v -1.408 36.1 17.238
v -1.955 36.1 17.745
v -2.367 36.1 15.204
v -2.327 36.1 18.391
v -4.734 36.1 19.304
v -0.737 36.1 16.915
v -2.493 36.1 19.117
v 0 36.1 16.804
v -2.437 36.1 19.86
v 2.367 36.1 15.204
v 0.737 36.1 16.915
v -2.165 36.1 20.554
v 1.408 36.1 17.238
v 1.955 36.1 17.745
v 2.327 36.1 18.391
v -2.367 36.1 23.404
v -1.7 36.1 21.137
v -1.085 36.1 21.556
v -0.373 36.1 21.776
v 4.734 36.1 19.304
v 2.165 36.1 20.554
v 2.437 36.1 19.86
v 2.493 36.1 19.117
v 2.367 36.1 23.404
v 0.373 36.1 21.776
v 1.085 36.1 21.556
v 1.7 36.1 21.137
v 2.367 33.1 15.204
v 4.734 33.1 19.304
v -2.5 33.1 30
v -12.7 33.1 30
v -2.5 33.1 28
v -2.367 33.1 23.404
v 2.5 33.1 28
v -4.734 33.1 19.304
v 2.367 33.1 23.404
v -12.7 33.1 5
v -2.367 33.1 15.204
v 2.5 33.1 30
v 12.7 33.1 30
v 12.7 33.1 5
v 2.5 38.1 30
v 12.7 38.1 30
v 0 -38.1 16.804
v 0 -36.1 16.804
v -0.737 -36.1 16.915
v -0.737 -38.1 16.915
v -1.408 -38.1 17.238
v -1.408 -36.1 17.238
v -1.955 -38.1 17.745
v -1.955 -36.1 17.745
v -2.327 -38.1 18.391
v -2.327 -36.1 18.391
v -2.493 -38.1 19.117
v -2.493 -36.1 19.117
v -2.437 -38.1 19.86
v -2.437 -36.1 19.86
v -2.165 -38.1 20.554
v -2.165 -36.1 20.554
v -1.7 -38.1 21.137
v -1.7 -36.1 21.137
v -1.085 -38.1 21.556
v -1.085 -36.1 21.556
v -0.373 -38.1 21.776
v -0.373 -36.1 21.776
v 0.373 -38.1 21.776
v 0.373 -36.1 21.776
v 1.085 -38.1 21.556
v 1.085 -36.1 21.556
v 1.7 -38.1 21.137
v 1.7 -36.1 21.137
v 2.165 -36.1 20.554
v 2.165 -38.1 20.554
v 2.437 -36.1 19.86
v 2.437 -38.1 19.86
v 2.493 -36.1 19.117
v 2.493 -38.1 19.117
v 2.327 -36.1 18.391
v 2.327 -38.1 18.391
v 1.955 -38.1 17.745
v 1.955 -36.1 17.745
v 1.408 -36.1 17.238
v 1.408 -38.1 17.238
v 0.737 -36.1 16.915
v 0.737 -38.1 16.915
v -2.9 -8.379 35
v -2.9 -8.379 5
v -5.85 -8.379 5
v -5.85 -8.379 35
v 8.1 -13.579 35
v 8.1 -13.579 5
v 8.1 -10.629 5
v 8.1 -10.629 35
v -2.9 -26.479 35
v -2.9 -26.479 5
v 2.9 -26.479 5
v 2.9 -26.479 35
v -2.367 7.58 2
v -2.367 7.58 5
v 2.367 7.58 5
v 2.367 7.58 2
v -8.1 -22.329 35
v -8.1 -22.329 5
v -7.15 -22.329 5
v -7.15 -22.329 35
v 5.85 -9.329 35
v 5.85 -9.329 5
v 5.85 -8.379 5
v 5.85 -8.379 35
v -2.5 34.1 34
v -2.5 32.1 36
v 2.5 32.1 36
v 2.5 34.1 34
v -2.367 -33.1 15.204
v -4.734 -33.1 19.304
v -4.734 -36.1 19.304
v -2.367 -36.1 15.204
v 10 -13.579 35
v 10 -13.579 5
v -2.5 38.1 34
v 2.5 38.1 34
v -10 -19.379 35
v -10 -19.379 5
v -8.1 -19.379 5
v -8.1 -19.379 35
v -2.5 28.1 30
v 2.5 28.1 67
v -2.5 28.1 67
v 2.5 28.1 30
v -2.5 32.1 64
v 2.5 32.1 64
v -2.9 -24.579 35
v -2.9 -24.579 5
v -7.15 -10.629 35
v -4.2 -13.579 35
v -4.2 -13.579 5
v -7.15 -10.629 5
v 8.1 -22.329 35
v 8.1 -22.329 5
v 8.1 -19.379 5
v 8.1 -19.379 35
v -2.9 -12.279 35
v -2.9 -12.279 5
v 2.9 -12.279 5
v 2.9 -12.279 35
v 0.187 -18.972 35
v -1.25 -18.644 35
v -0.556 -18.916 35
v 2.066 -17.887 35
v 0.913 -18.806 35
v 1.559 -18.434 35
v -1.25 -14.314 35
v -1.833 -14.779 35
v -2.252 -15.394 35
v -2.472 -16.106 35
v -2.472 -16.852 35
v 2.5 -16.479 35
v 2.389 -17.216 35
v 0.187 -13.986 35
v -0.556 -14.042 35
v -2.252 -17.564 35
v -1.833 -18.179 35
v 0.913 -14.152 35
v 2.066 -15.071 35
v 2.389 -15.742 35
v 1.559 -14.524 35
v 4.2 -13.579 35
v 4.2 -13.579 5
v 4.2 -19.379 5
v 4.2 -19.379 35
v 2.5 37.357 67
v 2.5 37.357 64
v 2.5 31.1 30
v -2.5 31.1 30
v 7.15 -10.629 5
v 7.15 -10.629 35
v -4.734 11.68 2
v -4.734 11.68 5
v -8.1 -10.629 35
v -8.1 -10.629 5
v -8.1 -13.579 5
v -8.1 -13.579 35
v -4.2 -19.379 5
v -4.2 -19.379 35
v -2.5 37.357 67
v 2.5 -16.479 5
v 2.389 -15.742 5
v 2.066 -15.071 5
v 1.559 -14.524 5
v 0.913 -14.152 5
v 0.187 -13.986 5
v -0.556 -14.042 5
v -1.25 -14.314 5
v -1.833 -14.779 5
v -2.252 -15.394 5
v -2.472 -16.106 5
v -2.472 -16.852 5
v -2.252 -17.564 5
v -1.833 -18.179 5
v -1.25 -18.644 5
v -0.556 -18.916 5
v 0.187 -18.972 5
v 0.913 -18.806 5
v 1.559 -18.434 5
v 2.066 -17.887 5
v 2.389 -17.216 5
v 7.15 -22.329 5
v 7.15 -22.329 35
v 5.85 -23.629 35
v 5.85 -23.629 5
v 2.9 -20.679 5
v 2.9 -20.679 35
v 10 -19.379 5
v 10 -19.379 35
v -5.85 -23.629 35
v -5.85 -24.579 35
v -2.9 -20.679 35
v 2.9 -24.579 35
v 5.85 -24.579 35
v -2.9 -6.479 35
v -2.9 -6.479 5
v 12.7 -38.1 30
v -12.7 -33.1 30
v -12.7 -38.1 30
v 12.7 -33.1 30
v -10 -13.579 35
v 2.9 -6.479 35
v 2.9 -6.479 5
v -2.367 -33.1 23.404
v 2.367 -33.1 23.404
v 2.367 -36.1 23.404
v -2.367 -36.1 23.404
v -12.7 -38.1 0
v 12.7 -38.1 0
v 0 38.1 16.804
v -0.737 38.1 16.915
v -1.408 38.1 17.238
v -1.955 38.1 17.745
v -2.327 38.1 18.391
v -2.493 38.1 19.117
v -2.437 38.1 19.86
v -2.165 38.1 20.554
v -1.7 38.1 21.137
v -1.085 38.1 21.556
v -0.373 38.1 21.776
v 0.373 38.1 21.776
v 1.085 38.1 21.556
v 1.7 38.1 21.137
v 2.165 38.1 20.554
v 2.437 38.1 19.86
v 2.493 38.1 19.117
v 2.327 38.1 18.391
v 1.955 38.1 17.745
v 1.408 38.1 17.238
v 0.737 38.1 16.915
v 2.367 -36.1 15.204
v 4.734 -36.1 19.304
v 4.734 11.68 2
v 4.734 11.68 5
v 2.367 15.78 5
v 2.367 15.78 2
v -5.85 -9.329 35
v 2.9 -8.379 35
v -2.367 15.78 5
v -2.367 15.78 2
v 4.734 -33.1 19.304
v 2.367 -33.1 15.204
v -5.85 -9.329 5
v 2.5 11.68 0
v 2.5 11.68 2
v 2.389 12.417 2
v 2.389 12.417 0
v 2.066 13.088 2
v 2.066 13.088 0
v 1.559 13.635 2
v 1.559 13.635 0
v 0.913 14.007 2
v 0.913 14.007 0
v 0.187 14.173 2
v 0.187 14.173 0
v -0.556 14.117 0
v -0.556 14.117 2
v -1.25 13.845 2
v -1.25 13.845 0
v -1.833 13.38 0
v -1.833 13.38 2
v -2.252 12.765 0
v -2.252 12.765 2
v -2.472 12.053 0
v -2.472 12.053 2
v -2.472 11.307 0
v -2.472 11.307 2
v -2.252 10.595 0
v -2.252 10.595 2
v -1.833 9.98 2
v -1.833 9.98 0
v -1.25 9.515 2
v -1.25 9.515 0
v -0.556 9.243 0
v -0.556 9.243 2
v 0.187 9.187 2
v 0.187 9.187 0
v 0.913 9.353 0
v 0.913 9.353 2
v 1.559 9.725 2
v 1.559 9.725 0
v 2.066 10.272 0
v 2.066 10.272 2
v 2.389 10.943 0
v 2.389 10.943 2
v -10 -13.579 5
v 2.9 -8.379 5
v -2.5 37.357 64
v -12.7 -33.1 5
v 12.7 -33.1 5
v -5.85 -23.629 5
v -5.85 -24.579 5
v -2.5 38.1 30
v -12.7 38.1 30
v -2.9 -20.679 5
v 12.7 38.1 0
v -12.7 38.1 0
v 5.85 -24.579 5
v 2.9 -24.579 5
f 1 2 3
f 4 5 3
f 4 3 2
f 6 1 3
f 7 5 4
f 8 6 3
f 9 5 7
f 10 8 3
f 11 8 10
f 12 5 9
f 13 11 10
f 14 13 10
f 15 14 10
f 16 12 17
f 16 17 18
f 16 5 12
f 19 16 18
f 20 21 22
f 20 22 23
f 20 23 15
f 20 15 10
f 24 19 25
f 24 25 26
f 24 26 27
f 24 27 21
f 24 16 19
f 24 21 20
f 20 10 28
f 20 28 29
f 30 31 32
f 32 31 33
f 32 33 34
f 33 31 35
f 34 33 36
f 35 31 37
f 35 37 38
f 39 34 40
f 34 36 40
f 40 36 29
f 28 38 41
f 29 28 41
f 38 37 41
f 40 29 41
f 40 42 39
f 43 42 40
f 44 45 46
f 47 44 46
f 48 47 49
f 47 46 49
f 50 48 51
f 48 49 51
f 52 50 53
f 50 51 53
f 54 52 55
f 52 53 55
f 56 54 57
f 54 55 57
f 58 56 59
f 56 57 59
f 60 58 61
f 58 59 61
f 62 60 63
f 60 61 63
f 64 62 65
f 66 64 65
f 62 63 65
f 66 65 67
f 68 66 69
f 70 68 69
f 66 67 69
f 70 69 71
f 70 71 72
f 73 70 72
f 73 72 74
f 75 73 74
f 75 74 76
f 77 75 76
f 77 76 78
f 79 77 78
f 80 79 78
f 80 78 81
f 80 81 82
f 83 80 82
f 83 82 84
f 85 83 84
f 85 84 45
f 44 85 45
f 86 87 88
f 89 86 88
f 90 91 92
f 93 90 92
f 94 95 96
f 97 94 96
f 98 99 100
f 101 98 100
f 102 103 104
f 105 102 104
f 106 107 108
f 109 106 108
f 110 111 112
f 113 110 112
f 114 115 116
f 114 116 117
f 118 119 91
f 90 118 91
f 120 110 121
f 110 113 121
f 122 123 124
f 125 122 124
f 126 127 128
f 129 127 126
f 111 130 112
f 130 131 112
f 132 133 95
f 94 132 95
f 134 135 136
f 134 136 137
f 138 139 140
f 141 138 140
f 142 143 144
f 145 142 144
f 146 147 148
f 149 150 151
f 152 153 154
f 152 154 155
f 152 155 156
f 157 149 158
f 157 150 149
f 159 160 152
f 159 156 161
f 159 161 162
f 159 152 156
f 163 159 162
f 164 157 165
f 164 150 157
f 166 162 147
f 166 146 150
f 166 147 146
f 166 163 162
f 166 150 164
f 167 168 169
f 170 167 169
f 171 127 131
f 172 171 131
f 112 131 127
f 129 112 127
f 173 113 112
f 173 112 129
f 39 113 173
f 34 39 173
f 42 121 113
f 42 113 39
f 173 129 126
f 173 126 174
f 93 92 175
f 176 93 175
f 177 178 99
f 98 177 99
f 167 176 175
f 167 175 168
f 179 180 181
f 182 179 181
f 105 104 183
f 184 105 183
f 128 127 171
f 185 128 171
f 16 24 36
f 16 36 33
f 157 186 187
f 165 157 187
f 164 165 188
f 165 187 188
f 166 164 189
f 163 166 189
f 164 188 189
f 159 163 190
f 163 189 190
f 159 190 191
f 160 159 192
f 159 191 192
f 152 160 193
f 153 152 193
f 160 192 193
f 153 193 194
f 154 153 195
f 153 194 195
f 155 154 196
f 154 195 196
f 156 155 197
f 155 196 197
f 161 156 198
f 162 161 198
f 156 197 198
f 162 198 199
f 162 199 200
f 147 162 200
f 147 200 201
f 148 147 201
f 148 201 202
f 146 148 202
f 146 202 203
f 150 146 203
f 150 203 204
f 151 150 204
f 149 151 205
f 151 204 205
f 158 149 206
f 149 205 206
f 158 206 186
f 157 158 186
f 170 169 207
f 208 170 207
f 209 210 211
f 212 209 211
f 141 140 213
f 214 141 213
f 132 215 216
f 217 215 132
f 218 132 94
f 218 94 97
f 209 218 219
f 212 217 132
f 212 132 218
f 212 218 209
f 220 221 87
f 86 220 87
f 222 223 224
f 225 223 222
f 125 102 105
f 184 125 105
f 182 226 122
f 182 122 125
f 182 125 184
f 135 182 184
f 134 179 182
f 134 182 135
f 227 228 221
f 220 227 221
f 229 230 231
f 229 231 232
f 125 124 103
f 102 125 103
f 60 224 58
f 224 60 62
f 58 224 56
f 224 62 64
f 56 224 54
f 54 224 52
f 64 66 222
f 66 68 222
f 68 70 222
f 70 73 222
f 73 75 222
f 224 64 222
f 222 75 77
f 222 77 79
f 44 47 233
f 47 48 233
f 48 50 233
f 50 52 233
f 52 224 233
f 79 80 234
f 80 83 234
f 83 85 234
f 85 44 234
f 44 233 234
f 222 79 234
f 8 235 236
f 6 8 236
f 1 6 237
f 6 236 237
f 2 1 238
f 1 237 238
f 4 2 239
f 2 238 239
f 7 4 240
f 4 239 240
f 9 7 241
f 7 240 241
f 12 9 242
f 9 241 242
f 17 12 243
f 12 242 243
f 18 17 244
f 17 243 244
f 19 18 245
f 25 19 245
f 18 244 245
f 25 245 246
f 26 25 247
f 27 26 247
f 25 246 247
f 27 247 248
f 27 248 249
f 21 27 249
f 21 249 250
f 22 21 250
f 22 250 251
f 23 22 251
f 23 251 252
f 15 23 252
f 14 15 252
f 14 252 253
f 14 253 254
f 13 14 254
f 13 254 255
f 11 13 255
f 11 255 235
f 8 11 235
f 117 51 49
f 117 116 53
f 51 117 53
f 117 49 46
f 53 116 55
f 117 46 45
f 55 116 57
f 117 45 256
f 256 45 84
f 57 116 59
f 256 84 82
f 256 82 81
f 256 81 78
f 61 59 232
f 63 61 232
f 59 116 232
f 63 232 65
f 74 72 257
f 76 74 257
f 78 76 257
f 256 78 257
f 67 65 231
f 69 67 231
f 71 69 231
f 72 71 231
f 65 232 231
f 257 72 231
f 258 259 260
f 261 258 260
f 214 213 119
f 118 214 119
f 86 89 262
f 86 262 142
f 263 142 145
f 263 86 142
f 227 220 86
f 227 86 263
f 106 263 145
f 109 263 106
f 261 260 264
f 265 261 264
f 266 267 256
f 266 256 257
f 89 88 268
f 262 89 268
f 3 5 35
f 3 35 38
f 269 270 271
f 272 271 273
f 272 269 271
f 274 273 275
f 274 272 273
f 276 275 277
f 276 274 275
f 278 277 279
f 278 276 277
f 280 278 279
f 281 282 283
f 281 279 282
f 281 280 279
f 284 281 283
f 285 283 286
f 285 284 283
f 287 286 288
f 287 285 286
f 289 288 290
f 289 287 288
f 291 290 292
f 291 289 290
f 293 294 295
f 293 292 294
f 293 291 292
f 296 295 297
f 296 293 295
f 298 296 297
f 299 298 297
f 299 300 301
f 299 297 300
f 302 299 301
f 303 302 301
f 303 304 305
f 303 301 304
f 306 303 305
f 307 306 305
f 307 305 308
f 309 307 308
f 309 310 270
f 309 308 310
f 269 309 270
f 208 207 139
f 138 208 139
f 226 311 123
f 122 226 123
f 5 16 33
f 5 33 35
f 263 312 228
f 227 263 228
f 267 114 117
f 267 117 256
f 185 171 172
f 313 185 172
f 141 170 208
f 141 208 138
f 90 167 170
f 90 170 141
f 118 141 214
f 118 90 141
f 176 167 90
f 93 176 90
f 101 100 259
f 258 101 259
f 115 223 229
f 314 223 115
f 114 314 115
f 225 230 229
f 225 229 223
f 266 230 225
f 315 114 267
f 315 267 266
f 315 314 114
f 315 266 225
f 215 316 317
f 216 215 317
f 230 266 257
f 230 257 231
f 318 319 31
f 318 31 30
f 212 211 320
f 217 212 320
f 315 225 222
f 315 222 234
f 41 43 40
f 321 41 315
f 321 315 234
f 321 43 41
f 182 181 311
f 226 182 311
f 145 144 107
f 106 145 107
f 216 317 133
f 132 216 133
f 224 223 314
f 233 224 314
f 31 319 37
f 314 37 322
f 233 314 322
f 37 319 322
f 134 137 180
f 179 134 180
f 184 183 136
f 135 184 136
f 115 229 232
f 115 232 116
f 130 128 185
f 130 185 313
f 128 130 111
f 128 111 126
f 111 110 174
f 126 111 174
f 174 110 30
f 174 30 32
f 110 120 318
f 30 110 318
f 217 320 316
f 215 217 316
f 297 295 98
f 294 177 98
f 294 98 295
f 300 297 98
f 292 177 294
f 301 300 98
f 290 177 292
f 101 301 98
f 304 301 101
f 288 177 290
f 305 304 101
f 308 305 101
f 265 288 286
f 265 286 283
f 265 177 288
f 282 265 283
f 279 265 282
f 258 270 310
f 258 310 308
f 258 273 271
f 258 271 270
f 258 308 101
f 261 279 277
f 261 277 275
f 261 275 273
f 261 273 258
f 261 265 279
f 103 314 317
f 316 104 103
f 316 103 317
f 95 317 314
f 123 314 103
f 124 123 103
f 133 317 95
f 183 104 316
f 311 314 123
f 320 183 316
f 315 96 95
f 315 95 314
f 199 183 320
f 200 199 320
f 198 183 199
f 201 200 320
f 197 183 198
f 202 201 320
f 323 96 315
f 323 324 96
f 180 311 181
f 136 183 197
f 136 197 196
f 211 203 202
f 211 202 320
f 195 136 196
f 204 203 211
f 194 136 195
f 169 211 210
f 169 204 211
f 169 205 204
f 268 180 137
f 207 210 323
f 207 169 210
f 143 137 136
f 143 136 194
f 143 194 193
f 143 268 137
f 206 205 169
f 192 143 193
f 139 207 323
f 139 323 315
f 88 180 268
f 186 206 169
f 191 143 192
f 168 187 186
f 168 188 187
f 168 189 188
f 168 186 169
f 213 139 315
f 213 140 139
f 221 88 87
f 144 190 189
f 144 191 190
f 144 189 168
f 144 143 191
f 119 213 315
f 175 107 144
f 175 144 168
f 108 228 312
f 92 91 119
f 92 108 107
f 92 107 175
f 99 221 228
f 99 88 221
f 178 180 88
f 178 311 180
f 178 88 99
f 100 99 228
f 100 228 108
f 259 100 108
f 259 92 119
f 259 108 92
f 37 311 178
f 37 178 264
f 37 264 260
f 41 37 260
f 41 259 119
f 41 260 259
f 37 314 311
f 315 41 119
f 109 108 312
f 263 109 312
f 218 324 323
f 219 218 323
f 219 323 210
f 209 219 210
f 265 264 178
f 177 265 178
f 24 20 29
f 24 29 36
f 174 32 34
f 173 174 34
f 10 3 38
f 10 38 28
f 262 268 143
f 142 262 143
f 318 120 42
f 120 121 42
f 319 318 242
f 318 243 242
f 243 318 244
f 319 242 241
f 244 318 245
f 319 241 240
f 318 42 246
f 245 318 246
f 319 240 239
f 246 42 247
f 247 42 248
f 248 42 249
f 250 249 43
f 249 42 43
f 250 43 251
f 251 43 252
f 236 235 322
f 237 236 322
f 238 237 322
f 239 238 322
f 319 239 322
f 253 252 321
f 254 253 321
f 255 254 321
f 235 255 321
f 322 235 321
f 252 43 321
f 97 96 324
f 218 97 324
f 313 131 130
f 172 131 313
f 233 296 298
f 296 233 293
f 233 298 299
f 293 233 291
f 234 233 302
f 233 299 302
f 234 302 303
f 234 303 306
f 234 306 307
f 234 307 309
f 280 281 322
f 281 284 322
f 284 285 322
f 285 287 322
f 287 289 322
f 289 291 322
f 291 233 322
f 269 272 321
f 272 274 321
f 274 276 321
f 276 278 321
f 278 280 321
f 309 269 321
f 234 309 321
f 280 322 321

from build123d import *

# Parameters (mm, degrees)
SKETCH1_W           = 25.4
SKETCH1_H           = 76.2
SKETCH1_R           = 2.5
BOSS_EXTRUDE1_DEPTH = 5
BOSS_EXTRUDE2_START = 38.1
SKETCH3_W           = 25.4
SKETCH3_H           = 25
SKETCH3_R           = 2.5
BOSS_EXTRUDE2_DEPTH = 5
BOSS_EXTRUDE3_START = -33.1
SKETCH3_5_W         = 25.4
SKETCH3_5_H         = 25
SKETCH3_5_R         = 2.5
BOSS_EXTRUDE3_DEPTH = 5
CUT_EXTRUDE1_START  = -3
CUT_EXTRUDE1_DEPTH  = 72.2
SKETCH5_R           = 2.5
BOSS_EXTRUDE4_DEPTH = 30
CUT_EXTRUDE2_DEPTH  = 3
SKETCH7_W           = 4
SKETCH7_H           = 10
SKETCH7_W_2         = 30
SKETCH7_H_2         = 4
SKETCH7_W_3         = 3
SKETCH7_H_3         = 9.256727868
BOSS_EXTRUDE5_DEPTH = 2.5
CHAMFER1_SIZE       = 2


with BuildPart() as part:
    # Sketch1 → Boss-Extrude1 (new body)
    with BuildSketch(Plane.XY):
        Rectangle(SKETCH1_W, SKETCH1_H)
        with Locations((0, 11.68)):
            Circle(SKETCH1_R, mode=Mode.SUBTRACT)
    extrude(amount=BOSS_EXTRUDE1_DEPTH)

    # Sketch3 → Boss-Extrude2 (add)
    with BuildSketch(Plane(origin=(0, 0, 0), x_dir=(1, 0, 0), z_dir=(0, 1, 0)).offset(BOSS_EXTRUDE2_START)):
        with Locations((0, -17.5)):
            Rectangle(SKETCH3_W, SKETCH3_H)
        with Locations(Location((0, -19.304, 0), (0, 0, 90))):
            Circle(SKETCH3_R, mode=Mode.SUBTRACT)
    extrude(amount=-BOSS_EXTRUDE2_DEPTH)

    # Sketch3<5> → Boss-Extrude3 (add)
    with BuildSketch(Plane(origin=(0, 0, 0), x_dir=(1, 0, 0), z_dir=(0, 1, 0)).offset(BOSS_EXTRUDE3_START)):
        with Locations((0, -17.5)):
            Rectangle(SKETCH3_5_W, SKETCH3_5_H)
        with Locations(Location((0, -19.304, 0), (0, 0, 90))):
            Circle(SKETCH3_5_R, mode=Mode.SUBTRACT)
    extrude(amount=-BOSS_EXTRUDE3_DEPTH)

    # Sketch4 → Cut-Extrude1 (cut)
    with BuildSketch(Plane.XZ.offset(-33.1).offset(CUT_EXTRUDE1_START)):
        Polygon((2.367136104, 15.204), (4.734272207, 19.304), (2.367136104, 23.404), (-2.367136104, 23.404), (-4.734272207, 19.304), (-2.367136104, 15.204), align=None)
    extrude(amount=CUT_EXTRUDE1_DEPTH, mode=Mode.SUBTRACT)

    # Sketch5 → Boss-Extrude4 (add)
    with BuildSketch(Plane.XY.offset(5)):
        with Locations((0, -16.479)):
            Circle(SKETCH5_R)
        Polygon((-2.9, -12.279), (2.9, -12.279), (5.85, -9.329), (5.85, -8.379), (2.9, -8.379), (2.9, -6.479), (-2.9, -6.479), (-2.9, -8.379), (-5.85, -8.379), (-5.85, -9.329), align=None)
        Polygon((4.2, -13.579), (4.2, -19.379), (7.15, -22.329), (8.1, -22.329), (8.1, -19.379), (10, -19.379), (10, -13.579), (8.1, -13.579), (8.1, -10.629), (7.15, -10.629), align=None)
        Polygon((2.9, -20.679), (-2.9, -20.679), (-5.85, -23.629), (-5.85, -24.579), (-2.9, -24.579), (-2.9, -26.479), (2.9, -26.479), (2.9, -24.579), (5.85, -24.579), (5.85, -23.629), align=None)
        Polygon((-4.2, -19.379), (-4.2, -13.579), (-7.15, -10.629), (-8.1, -10.629), (-8.1, -13.579), (-10, -13.579), (-10, -19.379), (-8.1, -19.379), (-8.1, -22.329), (-7.15, -22.329), align=None)
    extrude(amount=BOSS_EXTRUDE4_DEPTH)

    # Sketch6 → Cut-Extrude2 (cut)
    with BuildSketch(Plane.XY.offset(5)):
        Polygon((2.367136104, 7.58), (4.734272207, 11.68), (2.367136104, 15.78), (-2.367136104, 15.78), (-4.734272207, 11.68), (-2.367136104, 7.58), align=None)
    extrude(amount=-CUT_EXTRUDE2_DEPTH, mode=Mode.SUBTRACT)

    # Sketch7 → Boss-Extrude5 (add, symmetric)
    with BuildSketch(Plane(origin=(0, 0, 0), x_dir=(0, 0, -1), z_dir=(1, 0, 0))):
        with Locations((-32, 33.1)):
            Rectangle(SKETCH7_W, SKETCH7_H)
        with Locations((-49, 30.1)):
            Rectangle(SKETCH7_W_2, SKETCH7_H_2)
        with Locations((-65.5, 32.728363934)):
            Rectangle(SKETCH7_W_3, SKETCH7_H_3)
    extrude(amount=BOSS_EXTRUDE5_DEPTH, both=True)

    # Chamfer1
    chamfer1_edges = [part.edges().sort_by_distance(p)[0] for p in [
        (0, 33.1, 30),
        (0, 32.1, 34),
    ]]
    chamfer(chamfer1_edges, length=CHAMFER1_SIZE)


solid = part.part
